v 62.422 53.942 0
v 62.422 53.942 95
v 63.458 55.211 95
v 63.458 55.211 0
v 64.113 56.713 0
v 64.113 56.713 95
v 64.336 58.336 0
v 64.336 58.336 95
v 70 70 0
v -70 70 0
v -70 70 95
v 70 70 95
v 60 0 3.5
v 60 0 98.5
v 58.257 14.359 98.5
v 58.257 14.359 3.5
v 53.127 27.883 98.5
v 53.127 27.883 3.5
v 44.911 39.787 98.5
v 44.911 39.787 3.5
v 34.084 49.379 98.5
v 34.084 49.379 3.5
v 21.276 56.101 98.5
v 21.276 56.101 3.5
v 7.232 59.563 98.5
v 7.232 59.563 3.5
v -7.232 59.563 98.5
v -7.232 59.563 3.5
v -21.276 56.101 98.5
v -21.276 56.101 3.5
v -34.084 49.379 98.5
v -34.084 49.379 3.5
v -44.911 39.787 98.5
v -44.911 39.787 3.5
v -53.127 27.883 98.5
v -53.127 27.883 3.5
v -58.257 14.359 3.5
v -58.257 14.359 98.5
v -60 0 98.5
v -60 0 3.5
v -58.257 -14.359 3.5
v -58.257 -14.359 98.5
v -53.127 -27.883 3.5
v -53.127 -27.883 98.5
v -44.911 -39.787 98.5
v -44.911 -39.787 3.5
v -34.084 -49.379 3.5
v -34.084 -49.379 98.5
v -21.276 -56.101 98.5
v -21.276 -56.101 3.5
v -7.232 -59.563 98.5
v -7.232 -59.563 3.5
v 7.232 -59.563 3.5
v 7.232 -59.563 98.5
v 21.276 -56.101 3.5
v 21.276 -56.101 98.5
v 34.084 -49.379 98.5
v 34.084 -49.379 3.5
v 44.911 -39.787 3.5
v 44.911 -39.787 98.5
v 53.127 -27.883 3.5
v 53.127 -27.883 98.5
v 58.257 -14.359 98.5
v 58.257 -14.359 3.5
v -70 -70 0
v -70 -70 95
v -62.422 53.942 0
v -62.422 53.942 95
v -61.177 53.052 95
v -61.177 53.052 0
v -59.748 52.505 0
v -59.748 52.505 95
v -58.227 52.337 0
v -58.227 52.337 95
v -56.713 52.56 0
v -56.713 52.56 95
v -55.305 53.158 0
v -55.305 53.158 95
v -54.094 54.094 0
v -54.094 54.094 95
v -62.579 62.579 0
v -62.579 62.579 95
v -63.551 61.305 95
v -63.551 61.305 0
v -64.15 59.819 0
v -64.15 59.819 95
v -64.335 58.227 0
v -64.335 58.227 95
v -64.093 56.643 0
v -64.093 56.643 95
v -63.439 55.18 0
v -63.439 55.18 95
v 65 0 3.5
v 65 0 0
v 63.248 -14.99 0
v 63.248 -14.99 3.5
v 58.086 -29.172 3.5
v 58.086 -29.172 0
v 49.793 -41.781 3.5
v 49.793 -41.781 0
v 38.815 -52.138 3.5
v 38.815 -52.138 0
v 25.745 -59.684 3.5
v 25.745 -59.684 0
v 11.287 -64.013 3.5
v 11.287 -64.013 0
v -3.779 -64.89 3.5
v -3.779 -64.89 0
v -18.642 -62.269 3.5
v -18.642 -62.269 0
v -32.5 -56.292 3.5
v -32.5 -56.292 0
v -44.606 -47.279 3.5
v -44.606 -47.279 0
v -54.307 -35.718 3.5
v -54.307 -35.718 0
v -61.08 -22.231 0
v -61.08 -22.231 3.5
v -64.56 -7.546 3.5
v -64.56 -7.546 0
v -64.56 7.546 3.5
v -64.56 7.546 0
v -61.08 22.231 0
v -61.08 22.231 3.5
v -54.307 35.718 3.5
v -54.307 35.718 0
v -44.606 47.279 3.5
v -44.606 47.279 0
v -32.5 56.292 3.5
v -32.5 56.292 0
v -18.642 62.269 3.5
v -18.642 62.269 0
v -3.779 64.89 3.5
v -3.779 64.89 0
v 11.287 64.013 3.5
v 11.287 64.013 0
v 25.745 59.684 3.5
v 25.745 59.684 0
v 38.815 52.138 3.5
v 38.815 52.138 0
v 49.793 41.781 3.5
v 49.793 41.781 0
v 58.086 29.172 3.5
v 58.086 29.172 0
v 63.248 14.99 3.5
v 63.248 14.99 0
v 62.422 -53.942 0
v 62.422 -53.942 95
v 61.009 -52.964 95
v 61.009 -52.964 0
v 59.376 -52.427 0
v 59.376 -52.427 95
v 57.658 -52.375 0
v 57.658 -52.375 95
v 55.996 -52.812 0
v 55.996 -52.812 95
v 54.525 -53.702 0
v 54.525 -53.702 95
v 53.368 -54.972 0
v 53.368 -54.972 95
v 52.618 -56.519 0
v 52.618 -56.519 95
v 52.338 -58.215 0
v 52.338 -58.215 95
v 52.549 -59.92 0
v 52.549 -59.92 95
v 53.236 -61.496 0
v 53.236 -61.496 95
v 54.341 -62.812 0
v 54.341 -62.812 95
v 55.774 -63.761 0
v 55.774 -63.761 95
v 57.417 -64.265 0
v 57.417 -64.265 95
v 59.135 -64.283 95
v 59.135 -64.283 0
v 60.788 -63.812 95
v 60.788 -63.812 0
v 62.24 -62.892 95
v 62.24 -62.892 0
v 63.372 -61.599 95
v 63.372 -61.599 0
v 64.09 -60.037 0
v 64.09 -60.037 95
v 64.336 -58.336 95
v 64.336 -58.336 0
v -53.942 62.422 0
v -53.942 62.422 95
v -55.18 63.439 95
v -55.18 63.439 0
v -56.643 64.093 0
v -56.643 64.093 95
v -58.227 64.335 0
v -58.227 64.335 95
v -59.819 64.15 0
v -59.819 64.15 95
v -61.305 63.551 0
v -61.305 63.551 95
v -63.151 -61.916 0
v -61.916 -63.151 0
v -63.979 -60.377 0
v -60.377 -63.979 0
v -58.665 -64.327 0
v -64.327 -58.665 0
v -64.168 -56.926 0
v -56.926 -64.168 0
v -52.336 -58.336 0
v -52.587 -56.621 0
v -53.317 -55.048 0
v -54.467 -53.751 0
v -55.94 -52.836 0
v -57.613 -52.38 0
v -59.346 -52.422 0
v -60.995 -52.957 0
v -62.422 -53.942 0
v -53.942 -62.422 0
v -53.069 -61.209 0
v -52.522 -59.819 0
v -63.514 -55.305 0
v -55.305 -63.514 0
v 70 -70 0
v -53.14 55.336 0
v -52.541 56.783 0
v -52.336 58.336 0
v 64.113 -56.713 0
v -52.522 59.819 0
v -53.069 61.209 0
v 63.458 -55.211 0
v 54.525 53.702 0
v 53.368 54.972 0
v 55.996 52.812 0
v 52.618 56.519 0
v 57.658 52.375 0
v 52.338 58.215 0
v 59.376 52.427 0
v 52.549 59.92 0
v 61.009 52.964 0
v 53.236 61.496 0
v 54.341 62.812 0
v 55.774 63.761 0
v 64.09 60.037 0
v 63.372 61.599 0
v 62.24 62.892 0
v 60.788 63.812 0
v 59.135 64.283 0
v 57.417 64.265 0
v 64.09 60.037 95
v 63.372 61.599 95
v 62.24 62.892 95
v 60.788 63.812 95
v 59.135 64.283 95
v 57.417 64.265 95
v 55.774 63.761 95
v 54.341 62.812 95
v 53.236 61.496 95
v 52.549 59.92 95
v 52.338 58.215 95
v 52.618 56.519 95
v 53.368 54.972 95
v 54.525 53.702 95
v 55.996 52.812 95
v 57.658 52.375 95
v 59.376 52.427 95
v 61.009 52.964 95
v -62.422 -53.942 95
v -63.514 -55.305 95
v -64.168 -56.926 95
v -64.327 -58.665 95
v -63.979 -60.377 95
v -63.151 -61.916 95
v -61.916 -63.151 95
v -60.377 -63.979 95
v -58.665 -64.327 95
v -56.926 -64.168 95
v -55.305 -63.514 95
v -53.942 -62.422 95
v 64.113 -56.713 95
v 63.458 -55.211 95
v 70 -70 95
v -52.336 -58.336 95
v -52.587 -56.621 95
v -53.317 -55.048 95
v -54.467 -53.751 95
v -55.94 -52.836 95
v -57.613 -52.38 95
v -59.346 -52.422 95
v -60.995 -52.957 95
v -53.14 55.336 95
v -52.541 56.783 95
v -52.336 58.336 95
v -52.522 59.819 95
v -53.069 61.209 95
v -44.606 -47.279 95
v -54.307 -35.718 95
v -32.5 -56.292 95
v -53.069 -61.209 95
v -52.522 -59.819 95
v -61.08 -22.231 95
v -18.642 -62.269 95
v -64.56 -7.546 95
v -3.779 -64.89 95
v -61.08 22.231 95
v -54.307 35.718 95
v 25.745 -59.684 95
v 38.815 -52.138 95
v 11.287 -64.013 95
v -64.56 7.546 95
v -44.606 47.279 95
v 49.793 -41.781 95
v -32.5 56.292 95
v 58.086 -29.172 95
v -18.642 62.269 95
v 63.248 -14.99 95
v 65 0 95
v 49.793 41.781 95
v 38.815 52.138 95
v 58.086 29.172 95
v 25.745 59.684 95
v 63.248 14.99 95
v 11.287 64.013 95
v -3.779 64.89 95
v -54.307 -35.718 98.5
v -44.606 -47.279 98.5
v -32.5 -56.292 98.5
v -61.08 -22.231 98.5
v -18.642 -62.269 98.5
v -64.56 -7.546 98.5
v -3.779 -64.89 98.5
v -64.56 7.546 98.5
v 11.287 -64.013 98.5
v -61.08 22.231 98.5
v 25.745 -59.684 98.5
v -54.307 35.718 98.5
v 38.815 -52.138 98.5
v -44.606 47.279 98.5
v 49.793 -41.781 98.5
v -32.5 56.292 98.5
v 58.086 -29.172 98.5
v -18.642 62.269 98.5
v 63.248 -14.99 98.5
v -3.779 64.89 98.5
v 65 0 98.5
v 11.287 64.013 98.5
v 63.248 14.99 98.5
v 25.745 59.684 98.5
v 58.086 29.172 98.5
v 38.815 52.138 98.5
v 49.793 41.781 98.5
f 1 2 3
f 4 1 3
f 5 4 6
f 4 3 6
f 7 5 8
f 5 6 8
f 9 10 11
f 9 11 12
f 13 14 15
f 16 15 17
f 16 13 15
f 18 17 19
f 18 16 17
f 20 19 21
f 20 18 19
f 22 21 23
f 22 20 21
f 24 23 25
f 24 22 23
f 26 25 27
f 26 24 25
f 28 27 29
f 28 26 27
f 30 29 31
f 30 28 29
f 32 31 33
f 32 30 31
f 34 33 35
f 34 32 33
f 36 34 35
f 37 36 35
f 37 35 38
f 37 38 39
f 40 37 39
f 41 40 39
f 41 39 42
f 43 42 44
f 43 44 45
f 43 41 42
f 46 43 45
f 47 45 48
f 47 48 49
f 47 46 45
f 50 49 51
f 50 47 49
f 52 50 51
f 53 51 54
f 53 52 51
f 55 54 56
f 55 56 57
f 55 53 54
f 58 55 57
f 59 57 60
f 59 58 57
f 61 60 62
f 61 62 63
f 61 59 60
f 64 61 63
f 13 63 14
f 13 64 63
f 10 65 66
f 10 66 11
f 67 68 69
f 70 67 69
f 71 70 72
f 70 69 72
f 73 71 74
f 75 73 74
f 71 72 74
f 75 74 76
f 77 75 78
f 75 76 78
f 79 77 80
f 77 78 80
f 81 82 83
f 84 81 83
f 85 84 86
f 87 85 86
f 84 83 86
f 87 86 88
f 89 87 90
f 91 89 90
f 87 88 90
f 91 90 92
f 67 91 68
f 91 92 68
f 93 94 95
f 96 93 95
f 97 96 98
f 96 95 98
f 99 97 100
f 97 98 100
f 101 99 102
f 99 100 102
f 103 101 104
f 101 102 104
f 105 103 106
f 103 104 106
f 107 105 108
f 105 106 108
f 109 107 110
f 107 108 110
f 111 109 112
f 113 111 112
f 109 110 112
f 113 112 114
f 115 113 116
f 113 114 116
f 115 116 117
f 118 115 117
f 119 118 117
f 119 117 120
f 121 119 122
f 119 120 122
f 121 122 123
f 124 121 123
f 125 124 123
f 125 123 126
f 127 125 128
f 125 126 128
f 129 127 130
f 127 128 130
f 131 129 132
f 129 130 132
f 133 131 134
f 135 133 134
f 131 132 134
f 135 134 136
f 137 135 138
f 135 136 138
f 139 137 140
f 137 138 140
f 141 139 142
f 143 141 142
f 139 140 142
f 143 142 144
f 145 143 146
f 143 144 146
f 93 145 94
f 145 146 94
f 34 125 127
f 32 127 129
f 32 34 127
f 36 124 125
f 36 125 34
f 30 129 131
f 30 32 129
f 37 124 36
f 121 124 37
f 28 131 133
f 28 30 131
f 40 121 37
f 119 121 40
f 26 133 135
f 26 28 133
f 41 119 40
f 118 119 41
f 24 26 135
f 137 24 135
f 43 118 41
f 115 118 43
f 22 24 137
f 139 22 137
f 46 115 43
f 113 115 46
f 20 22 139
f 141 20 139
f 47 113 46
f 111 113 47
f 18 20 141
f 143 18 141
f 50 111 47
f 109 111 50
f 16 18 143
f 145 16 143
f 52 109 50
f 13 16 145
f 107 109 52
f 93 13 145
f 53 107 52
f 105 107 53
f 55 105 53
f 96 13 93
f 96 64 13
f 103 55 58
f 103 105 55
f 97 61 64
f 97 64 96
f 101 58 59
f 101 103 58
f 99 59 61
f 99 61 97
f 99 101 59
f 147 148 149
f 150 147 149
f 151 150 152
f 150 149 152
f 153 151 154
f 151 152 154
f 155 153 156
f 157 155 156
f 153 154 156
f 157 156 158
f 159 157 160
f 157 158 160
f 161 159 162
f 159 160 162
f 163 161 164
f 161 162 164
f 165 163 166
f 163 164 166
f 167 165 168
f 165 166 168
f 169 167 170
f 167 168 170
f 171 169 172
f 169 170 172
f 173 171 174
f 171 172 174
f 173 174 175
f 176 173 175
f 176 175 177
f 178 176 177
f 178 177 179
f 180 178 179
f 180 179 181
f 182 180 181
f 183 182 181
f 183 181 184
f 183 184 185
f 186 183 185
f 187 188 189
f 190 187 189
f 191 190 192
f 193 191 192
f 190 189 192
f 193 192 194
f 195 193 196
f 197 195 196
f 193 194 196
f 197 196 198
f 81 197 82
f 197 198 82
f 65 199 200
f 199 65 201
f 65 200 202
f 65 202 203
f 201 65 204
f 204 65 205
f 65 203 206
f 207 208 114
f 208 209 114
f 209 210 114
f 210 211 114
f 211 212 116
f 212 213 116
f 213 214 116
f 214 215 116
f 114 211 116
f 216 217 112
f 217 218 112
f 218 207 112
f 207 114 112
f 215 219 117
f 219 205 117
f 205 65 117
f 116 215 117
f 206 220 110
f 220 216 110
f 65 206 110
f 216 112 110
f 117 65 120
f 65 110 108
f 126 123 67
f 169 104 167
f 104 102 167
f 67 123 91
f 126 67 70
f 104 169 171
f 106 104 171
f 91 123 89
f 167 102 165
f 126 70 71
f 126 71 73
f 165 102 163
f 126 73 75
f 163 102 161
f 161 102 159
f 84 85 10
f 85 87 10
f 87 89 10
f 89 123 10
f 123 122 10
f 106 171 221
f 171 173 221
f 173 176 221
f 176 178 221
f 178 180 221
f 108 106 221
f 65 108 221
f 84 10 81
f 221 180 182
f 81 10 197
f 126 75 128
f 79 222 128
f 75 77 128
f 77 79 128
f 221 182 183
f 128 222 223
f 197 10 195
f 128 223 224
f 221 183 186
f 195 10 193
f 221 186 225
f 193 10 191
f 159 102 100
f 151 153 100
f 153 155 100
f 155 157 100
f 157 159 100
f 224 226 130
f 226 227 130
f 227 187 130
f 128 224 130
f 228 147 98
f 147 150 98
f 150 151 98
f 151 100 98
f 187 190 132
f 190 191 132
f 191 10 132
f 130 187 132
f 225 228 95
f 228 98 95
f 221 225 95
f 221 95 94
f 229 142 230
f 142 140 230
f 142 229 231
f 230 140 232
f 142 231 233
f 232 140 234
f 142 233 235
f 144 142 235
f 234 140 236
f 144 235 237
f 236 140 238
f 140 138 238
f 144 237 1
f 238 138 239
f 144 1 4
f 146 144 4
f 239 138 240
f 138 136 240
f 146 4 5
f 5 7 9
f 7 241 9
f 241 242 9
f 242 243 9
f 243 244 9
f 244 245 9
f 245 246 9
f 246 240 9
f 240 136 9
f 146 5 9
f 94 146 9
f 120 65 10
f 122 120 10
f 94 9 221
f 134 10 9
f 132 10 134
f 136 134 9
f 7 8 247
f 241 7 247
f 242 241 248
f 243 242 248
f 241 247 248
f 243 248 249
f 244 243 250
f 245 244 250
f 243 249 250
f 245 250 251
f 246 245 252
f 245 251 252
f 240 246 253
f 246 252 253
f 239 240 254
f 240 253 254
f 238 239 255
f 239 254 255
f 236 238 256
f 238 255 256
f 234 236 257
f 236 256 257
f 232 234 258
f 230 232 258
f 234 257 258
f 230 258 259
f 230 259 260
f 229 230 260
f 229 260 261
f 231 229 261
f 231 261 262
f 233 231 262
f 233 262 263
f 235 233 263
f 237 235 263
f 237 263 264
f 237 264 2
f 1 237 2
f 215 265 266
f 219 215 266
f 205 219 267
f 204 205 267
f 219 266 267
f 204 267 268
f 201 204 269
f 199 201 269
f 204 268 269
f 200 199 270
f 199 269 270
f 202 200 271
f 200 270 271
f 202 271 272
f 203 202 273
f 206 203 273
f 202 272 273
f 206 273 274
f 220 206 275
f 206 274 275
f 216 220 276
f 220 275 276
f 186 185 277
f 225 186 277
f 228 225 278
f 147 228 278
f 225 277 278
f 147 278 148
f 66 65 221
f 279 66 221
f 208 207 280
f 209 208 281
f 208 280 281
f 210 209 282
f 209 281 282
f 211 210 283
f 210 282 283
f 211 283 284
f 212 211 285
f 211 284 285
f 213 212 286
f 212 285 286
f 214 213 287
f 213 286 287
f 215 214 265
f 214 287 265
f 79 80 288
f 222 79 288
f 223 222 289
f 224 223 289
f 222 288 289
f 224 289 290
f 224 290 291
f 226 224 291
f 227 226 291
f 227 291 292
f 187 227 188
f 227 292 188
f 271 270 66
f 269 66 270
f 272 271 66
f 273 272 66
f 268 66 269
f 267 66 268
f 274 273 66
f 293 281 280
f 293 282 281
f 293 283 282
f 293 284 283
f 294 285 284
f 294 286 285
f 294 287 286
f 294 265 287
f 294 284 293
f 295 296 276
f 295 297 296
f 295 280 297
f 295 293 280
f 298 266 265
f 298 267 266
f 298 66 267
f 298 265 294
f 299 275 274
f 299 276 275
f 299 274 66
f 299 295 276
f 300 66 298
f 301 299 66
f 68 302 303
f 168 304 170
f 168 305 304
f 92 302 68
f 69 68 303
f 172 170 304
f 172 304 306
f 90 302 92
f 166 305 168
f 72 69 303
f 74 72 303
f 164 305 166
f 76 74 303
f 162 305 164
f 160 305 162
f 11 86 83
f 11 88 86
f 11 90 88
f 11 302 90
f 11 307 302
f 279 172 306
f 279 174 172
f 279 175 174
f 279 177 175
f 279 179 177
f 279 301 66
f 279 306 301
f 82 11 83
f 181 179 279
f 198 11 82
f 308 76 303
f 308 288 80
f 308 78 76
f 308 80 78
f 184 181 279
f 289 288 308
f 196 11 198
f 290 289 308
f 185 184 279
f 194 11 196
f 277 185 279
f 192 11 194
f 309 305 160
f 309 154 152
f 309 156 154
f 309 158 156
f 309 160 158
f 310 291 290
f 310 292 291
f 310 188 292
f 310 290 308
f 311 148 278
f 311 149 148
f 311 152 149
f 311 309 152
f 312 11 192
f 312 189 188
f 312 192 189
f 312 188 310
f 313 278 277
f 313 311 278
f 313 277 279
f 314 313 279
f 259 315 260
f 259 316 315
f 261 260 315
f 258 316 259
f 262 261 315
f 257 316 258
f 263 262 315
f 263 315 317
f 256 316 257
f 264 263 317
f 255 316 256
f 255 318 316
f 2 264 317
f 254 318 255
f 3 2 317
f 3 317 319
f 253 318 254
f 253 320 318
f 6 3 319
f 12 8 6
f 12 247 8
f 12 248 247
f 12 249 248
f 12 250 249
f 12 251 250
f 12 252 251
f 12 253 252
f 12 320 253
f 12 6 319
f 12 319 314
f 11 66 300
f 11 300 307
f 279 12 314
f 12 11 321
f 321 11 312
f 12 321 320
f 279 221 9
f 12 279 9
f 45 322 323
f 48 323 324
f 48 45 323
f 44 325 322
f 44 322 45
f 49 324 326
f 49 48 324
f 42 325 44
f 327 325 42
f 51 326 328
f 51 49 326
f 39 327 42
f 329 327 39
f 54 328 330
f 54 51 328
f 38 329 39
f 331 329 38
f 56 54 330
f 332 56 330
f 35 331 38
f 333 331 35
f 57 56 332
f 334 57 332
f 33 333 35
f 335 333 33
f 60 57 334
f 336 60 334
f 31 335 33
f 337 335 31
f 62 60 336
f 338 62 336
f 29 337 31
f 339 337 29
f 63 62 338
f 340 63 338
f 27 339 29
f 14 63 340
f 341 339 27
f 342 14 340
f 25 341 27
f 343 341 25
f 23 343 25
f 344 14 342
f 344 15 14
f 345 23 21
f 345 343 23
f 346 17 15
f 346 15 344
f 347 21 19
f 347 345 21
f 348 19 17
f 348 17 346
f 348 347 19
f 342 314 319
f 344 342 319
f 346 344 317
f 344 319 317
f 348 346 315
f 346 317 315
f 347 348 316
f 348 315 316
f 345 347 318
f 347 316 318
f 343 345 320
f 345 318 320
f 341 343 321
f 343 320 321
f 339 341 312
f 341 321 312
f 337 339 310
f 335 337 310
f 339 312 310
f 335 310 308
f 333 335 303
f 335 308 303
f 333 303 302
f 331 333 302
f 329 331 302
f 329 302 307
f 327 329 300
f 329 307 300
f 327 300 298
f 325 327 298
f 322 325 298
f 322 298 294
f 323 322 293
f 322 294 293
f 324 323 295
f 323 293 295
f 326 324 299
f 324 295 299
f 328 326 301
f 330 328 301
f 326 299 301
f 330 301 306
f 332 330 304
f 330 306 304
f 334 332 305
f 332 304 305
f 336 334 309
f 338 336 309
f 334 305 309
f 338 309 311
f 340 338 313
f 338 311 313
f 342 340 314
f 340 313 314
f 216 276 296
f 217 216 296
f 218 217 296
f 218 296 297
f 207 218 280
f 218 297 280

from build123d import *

# Parameters (mm, degrees)
F0_W     = 140
F0_H     = 140
F0_R     = 60
F1_DEPTH = 95
F2_R     = 65
F2_R_2   = 60
F3_DEPTH = 3.5
F4_R     = 65
F4_R_2   = 50
F5_DEPTH = 3.5
F7_DEPTH = 95.001


with BuildPart() as f1:
    # F0 (on Top) → F1 (new body)
    with BuildSketch(Plane.XY):
        Rectangle(F0_W, F0_H)
        Circle(F0_R, mode=Mode.SUBTRACT)
    extrude(amount=F1_DEPTH)

    # F2 (on face) → F3 (join)
    with BuildSketch(Plane.XY.offset(95)):
        Circle(F2_R)
        Circle(F2_R_2, mode=Mode.SUBTRACT)
    extrude(amount=F3_DEPTH)

    # F4 (on face) → F5 (cut)
    with BuildSketch(Plane(origin=(0, 0, 0), x_dir=(1, 0, 0), z_dir=(0, 0, -1))):
        Circle(F4_R)
        Circle(F4_R_2, mode=Mode.SUBTRACT)
    extrude(amount=-F5_DEPTH, mode=Mode.SUBTRACT)

    # F6 (on face) → F7 (cut, through all)
    with BuildSketch(Plane.XY.offset(95)):
        with BuildLine():
            ThreePointArc((-58.3363094479, 58.3363094479), (-56.1764068849, 60.419047572), (-53.9421968972, 62.4218663122))
            ThreePointArc((-53.9421968972, 62.4218663122), (-58.2272004968, 64.3353173023), (-62.578950135, 62.578950135))
            Line((-62.578950135, 62.578950135), (-58.3363094479, 58.3363094479))
        make_face()
        with BuildLine():
            ThreePointArc((-52.3363094479, 58.3363094479), (-52.752194688, 60.5312268377), (-53.9421968972, 62.4218663122))
            ThreePointArc((-53.9421968972, 62.4218663122), (-56.1764068849, 60.419047572), (-58.3363094479, 58.3363094479))
            Line((-58.3363094479, 58.3363094479), (-54.0936687608, 54.0936687608))
            ThreePointArc((-54.0936687608, 54.0936687608), (-52.7930322528, 56.0402088537), (-52.3363094479, 58.3363094479))
        make_face()
        with BuildLine():
            Line((-54.0936687608, 54.0936687608), (-58.3363094479, 58.3363094479))
            ThreePointArc((-58.3363094479, 58.3363094479), (-60.419047572, 56.1764068849), (-62.4218663122, 53.9421968972))
            ThreePointArc((-62.4218663122, 53.9421968972), (-58.2272004968, 52.3373015935), (-54.0936687608, 54.0936687608))
        make_face()
        with BuildLine():
            ThreePointArc((-62.4218663122, 53.9421968972), (-60.419047572, 56.1764068849), (-58.3363094479, 58.3363094479))
            Line((-58.3363094479, 58.3363094479), (-62.578950135, 62.578950135))
            ThreePointArc((-62.578950135, 62.578950135), (-64.3353173023, 58.2272004968), (-62.4218663122, 53.9421968972))
        make_face()
        with BuildLine():
            ThreePointArc((53.9421968972, 62.4218663122), (58.3363094479, 58.3363094479), (62.4218663122, 53.9421968972))
            ThreePointArc((62.4218663122, 53.9421968972), (63.836915832, 55.9397850047), (64.3363094479, 58.3363094479))
            ThreePointArc((64.3363094479, 58.3363094479), (60.5312268377, 63.9204242078), (53.9421968972, 62.4218663122))
        make_face()
        with BuildLine():
            ThreePointArc((53.9421968972, 62.4218663122), (54.0936687608, 54.0936687608), (62.4218663122, 53.9421968972))
            ThreePointArc((62.4218663122, 53.9421968972), (58.3363094479, 58.3363094479), (53.9421968972, 62.4218663122))
        make_face()
        with BuildLine():
            ThreePointArc((64.3363094479, -58.3363094479), (63.836915832, -55.9397850047), (62.4218663122, -53.9421968972))
            ThreePointArc((62.4218663122, -53.9421968972), (58.3363094479, -58.3363094479), (53.9421968972, -62.4218663122))
            ThreePointArc((53.9421968972, -62.4218663122), (60.5312268377, -63.9204242078), (64.3363094479, -58.3363094479))
        make_face()
        with BuildLine():
            ThreePointArc((53.9421968972, -62.4218663122), (58.3363094479, -58.3363094479), (62.4218663122, -53.9421968972))
            ThreePointArc((62.4218663122, -53.9421968972), (54.0936687608, -54.0936687608), (53.9421968972, -62.4218663122))
        make_face()
        with BuildLine():
            ThreePointArc((-62.4218663122, -53.9421968972), (-62.578950135, -62.578950135), (-53.9421968972, -62.4218663122))
            ThreePointArc((-53.9421968972, -62.4218663122), (-58.3363094479, -58.3363094479), (-62.4218663122, -53.9421968972))
        make_face()
        with BuildLine():
            ThreePointArc((-62.4218663122, -53.9421968972), (-58.3363094479, -58.3363094479), (-53.9421968972, -62.4218663122))
            ThreePointArc((-53.9421968972, -62.4218663122), (-52.752194688, -60.5312268377), (-52.3363094479, -58.3363094479))
            ThreePointArc((-52.3363094479, -58.3363094479), (-55.9397850047, -52.8357030638), (-62.4218663122, -53.9421968972))
        make_face()
    extrude(amount=-F7_DEPTH, mode=Mode.SUBTRACT)


solid = f1.part
